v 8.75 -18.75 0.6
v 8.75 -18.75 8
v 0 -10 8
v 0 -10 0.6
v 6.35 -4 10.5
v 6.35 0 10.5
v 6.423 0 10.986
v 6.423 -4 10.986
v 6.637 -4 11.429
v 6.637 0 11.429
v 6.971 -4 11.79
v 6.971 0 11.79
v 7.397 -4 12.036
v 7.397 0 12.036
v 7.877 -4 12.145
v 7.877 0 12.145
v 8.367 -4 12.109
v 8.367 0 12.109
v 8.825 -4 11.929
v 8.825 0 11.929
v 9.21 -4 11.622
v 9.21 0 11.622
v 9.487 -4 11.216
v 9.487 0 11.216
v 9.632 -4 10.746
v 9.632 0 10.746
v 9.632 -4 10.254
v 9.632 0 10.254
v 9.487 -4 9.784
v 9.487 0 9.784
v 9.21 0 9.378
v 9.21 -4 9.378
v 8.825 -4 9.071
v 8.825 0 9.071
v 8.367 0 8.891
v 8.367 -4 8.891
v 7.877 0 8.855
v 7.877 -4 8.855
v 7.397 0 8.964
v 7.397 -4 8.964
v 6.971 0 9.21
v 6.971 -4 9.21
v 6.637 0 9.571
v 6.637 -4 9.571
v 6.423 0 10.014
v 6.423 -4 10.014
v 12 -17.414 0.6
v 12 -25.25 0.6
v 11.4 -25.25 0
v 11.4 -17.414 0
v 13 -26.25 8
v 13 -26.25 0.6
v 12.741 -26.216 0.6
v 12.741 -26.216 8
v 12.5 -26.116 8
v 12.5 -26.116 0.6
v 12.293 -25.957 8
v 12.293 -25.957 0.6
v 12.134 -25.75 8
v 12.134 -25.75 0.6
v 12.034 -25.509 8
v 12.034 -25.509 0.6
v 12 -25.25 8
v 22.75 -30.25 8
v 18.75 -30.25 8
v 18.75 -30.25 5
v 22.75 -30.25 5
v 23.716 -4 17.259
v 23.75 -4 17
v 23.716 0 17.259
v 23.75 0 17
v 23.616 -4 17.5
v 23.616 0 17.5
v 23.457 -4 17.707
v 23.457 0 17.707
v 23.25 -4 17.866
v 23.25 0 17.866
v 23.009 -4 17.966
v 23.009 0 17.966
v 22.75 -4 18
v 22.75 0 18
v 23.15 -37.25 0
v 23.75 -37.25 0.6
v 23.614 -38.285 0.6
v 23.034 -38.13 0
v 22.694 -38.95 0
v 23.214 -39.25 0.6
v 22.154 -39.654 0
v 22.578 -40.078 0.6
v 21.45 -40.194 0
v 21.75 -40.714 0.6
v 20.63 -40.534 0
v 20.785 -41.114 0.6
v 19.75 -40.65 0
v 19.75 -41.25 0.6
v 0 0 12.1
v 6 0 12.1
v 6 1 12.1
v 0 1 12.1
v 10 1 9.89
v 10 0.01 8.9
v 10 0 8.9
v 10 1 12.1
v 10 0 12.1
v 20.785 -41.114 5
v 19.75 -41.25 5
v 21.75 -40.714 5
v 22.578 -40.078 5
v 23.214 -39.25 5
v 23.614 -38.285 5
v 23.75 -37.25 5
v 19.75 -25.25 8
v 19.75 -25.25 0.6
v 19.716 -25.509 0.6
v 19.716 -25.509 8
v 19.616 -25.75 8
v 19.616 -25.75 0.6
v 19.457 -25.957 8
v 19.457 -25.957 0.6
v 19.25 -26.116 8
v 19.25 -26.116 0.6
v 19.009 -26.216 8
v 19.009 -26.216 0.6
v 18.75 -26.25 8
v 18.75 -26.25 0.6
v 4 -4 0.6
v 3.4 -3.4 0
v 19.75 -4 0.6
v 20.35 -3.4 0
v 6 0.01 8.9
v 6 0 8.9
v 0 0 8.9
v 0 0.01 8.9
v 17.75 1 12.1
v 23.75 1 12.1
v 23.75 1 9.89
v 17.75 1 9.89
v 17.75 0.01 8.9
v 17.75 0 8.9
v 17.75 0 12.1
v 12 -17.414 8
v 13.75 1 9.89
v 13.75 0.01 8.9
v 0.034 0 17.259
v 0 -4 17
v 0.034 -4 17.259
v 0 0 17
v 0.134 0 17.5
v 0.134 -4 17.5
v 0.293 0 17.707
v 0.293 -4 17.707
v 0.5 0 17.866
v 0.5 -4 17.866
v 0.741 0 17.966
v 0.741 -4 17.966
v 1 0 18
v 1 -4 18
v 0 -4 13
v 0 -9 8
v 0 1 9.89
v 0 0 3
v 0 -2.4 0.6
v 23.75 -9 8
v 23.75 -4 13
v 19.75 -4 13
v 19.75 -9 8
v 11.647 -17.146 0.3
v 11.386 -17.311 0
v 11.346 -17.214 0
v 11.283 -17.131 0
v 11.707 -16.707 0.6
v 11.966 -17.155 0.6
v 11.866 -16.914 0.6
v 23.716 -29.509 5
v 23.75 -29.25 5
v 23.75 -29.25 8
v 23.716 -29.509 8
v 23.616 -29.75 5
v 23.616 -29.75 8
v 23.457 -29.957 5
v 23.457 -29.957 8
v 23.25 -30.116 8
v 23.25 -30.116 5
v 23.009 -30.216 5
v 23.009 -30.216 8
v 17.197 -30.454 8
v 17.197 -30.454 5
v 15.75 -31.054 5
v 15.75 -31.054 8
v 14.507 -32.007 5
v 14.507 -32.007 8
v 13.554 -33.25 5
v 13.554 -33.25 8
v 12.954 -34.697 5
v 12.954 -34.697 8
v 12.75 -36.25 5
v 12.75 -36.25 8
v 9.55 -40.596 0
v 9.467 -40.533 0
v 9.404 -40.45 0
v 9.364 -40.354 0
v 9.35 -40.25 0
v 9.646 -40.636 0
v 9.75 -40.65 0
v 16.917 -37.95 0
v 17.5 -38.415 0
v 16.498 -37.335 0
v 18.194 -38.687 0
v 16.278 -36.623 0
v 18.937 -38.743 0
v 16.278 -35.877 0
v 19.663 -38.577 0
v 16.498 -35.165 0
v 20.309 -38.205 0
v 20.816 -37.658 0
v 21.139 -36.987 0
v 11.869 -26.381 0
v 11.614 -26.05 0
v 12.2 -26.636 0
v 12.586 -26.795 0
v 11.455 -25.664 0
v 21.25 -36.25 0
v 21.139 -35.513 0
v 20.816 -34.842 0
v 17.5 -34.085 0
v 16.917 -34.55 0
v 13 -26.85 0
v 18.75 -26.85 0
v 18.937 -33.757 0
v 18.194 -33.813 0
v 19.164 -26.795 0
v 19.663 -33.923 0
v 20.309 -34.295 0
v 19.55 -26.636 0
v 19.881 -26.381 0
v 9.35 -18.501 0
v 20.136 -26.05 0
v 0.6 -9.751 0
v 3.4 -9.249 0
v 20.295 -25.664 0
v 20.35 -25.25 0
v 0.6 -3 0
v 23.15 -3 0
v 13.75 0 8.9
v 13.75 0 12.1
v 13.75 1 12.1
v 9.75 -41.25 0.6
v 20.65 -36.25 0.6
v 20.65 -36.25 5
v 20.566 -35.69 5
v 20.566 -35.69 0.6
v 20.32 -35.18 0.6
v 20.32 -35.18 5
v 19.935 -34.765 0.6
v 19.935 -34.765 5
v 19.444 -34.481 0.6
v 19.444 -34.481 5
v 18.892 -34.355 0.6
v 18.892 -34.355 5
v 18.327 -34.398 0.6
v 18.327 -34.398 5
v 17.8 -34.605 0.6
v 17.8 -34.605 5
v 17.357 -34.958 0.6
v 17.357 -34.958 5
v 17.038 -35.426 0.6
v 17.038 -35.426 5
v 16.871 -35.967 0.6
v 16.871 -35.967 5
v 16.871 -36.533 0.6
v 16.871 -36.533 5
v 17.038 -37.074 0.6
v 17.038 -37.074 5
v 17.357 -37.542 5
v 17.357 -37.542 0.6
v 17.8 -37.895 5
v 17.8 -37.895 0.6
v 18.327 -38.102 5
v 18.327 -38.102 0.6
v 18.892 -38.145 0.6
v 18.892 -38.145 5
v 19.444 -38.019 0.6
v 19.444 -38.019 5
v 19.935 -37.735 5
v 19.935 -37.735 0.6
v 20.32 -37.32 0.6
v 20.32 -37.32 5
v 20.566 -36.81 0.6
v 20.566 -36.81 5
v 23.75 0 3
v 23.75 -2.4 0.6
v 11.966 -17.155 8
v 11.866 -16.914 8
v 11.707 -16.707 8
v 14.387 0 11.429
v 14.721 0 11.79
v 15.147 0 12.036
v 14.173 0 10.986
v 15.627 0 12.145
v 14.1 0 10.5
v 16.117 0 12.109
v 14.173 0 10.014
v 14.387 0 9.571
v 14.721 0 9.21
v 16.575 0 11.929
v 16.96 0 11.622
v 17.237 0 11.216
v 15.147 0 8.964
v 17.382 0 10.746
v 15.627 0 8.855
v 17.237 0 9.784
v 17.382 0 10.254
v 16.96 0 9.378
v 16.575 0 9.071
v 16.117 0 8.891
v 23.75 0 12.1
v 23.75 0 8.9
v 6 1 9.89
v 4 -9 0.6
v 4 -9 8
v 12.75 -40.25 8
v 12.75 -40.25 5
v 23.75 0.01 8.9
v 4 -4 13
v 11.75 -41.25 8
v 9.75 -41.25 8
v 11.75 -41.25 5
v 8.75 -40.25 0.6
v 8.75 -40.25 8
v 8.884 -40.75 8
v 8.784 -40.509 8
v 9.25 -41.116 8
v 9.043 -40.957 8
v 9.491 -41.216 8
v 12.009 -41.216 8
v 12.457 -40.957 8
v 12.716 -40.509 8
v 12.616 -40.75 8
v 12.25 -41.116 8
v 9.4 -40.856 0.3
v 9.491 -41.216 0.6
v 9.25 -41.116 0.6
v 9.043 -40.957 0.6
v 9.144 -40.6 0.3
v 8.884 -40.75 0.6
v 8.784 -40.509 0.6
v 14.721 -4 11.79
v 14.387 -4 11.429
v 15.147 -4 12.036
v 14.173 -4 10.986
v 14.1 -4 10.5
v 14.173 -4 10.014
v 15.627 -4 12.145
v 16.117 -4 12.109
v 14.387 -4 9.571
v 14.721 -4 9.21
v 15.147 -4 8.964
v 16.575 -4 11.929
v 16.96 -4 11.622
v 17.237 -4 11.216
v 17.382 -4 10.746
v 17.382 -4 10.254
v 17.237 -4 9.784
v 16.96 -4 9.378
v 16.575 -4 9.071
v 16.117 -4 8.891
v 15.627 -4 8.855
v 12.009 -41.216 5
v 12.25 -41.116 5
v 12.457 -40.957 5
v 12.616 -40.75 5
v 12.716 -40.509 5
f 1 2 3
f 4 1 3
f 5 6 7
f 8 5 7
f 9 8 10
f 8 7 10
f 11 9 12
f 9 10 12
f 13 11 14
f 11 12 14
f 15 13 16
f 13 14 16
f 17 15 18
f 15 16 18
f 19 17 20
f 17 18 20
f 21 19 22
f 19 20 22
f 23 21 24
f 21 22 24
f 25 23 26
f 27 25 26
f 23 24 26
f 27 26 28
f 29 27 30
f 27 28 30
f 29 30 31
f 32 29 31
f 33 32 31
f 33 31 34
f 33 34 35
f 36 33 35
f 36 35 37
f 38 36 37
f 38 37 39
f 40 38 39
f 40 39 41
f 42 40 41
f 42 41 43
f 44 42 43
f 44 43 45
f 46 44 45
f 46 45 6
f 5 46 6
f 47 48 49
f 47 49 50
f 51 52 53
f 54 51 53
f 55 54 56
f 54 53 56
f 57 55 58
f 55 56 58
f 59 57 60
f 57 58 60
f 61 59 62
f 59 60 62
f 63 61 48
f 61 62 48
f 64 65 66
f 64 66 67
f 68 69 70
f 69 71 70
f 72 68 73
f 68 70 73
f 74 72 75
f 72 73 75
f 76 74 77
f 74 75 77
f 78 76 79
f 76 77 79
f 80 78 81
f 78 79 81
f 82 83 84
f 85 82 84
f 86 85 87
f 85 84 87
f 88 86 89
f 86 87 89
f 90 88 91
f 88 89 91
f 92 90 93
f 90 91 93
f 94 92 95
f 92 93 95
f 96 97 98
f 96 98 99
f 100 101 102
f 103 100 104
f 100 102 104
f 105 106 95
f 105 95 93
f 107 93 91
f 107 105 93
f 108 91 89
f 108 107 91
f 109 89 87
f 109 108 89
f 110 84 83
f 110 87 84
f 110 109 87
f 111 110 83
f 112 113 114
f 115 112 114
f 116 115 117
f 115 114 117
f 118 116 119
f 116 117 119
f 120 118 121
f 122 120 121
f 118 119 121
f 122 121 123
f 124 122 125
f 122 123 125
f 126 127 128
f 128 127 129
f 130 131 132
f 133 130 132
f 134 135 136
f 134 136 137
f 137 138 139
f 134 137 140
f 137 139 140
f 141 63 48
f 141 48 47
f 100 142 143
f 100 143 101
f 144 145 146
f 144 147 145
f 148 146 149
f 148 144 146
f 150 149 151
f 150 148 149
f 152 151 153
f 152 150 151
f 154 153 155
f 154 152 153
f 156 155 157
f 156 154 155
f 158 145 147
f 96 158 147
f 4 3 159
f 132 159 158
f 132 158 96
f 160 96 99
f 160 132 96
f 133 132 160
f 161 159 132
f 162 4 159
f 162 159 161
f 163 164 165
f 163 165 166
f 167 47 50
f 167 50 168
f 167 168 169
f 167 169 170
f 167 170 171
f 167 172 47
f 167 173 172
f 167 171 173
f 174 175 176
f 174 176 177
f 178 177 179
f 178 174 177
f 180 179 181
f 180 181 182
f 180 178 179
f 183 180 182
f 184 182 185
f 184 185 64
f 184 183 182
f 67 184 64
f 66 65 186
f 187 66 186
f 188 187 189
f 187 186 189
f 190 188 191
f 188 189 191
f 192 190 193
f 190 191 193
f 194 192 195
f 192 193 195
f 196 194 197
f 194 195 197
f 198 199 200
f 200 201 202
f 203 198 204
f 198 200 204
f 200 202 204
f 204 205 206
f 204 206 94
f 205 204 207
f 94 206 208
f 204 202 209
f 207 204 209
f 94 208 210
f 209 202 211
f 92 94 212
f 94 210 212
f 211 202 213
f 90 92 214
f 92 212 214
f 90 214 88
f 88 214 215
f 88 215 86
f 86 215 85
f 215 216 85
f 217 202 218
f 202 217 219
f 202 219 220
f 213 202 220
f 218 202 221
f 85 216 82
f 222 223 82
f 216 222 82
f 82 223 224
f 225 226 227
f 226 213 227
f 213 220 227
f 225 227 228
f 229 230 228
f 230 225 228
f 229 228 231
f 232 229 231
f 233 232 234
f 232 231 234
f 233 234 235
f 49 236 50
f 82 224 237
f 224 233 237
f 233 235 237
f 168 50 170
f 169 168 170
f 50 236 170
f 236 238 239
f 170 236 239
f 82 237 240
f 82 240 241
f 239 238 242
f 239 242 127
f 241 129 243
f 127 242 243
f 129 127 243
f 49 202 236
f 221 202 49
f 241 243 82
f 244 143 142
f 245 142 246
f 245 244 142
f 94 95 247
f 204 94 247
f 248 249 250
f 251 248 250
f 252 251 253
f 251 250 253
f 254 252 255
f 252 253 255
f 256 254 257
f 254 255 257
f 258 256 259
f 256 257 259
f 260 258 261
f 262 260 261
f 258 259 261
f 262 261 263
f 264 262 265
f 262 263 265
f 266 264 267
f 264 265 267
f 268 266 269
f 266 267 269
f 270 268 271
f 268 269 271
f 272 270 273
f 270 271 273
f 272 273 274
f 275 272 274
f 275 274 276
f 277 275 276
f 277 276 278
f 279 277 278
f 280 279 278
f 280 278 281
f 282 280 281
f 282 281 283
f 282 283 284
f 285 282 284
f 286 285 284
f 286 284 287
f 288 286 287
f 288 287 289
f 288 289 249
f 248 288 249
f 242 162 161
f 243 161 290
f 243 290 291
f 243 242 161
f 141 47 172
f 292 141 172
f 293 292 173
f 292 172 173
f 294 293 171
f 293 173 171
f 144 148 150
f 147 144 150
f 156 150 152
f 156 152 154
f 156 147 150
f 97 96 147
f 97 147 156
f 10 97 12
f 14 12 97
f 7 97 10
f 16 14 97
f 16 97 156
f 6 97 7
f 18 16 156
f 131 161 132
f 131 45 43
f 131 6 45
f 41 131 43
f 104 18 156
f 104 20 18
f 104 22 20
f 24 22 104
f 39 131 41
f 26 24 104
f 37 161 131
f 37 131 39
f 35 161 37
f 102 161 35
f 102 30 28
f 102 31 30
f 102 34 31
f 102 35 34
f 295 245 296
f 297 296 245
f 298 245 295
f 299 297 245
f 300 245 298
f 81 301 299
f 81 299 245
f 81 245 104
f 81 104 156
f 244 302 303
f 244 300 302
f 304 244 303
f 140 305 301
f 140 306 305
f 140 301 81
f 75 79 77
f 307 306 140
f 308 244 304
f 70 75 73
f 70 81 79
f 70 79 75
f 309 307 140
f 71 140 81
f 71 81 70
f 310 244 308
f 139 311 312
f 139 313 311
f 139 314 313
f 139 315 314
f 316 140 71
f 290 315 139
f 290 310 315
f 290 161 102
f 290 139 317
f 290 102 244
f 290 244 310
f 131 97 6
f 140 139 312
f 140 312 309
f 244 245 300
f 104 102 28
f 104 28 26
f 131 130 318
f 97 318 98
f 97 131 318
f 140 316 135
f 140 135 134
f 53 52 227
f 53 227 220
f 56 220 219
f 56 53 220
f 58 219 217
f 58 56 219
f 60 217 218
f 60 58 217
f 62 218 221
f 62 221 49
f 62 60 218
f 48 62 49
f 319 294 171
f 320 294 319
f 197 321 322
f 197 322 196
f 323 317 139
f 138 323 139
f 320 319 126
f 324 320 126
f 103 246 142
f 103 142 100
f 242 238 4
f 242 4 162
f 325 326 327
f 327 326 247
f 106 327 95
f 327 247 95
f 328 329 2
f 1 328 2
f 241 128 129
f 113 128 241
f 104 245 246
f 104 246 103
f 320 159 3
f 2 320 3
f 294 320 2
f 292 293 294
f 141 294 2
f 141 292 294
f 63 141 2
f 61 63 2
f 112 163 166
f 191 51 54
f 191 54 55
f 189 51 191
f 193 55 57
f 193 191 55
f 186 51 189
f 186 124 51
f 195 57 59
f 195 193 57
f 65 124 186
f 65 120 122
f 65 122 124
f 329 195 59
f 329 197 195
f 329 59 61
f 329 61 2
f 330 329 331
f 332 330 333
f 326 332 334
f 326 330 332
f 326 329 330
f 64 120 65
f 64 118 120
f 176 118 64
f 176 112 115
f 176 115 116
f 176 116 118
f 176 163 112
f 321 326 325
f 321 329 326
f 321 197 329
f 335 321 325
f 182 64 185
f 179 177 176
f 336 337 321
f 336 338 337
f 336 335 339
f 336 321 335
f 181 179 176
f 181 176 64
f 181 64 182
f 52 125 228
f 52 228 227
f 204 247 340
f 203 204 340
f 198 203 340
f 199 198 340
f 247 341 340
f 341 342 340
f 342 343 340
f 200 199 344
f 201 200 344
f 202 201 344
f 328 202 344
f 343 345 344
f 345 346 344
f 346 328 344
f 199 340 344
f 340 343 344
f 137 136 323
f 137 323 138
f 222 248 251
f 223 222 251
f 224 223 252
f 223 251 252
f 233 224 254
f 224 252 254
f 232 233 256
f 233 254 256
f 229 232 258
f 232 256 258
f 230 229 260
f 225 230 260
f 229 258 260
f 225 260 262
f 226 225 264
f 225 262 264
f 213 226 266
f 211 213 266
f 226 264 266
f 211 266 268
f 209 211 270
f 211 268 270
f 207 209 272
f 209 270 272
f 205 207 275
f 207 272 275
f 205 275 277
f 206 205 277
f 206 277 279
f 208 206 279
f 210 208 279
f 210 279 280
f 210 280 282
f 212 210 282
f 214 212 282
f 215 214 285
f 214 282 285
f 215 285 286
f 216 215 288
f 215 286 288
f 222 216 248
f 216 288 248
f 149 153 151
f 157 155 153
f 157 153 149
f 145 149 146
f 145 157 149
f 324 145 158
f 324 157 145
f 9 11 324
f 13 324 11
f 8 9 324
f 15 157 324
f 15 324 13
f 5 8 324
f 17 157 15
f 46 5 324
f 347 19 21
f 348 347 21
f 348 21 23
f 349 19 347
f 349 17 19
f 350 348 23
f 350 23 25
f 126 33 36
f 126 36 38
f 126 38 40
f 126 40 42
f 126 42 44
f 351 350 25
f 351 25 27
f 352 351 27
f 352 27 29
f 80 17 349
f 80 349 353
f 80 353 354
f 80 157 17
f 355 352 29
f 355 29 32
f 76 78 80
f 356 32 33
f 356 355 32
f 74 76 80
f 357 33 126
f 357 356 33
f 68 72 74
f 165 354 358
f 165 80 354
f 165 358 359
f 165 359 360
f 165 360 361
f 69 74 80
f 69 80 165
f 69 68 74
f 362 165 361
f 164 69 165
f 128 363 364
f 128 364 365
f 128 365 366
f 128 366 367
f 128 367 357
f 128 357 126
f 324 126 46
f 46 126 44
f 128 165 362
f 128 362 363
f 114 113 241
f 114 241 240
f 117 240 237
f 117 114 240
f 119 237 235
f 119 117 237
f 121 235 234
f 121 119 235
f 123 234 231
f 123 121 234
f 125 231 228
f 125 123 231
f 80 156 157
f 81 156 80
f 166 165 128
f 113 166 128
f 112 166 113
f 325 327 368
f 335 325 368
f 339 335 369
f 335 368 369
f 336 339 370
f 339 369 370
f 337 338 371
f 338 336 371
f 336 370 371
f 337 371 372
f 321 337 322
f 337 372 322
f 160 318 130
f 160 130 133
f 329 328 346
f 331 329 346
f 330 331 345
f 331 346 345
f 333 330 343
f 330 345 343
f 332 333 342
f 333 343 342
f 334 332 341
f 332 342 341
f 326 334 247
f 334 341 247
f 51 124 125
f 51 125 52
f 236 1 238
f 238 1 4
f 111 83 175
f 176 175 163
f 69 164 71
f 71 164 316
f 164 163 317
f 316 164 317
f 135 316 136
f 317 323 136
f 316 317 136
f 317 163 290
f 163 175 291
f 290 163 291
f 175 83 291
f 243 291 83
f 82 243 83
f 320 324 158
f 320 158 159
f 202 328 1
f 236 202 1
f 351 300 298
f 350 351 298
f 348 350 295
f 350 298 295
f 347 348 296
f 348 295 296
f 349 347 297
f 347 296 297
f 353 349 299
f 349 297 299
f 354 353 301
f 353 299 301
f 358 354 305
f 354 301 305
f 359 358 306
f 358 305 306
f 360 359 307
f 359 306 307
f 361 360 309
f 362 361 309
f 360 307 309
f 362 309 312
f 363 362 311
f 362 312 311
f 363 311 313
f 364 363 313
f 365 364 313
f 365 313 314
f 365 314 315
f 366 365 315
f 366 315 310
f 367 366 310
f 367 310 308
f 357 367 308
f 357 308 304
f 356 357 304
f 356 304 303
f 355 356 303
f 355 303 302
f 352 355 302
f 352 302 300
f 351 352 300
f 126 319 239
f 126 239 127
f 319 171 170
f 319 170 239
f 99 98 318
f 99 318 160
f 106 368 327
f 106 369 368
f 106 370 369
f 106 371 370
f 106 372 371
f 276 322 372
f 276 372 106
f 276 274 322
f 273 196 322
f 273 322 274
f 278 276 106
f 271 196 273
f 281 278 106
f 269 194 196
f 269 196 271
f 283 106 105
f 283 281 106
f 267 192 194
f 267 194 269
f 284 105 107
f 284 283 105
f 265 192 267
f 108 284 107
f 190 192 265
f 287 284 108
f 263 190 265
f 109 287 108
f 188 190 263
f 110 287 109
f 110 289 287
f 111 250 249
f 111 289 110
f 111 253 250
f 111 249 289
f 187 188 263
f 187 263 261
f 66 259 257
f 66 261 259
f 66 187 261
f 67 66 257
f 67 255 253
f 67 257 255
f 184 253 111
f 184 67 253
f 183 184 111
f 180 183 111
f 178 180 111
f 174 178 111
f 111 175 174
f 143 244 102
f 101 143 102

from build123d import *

# Parameters (mm, degrees)
SKETCH010_W                                = 23.75
SKETCH010_H                                = 41.25
PAD003_DEPTH                               = 18
CHAMFER004013007011015006009007001028_SIZE = 3
SKETCH011_R                                = 1.9
POCKET007_DEPTH                            = 18.001
POCKET008_DEPTH                            = 13
FILLET_R                                   = 4
POCKET009_DEPTH                            = 18.001
FILLET001_R                                = 1
POCKET010_DEPTH                            = 23.751
FILLET002_R                                = 1
POCKET011_DEPTH                            = 18.001
FILLET003_R                                = 1
SKETCH016_R                                = 1.65
POCKET012_DEPTH                            = 41.251
SKETCH017_W                                = 6
SKETCH017_H                                = 3.2
SKETCH017_W_2                              = 3.75
PAD004_DEPTH                               = 1
CHAMFER004013007011015006009007001029_SIZE = 0.99
CHAMFER004013007011015006009007001030_SIZE = 0.6
CHAMFER004013007011015006009007001031_SIZE = 0.6


with BuildPart() as part:
    # Sketch010 → Pad003 (new body)
    with BuildSketch(Plane.XY):
        with Locations((11.875, -20.625)):
            Rectangle(SKETCH010_W, SKETCH010_H)
    extrude(amount=PAD003_DEPTH)

    # Chamfer004013007011015006009007001028
    chamfer004013007011015006009007001028_edges = [part.edges().sort_by_distance(p)[0] for p in [
        (11.875, 0, 0),
    ]]
    chamfer(chamfer004013007011015006009007001028_edges, length=CHAMFER004013007011015006009007001028_SIZE)

    # Sketch011 (on Face4 of Chamfer004013007011015006009007001028) → Pocket007 (cut, through all)
    with BuildSketch(Plane.XY.offset(18)):
        with Locations((18.75, -36.25)):
            Circle(SKETCH011_R)
    extrude(amount=-POCKET007_DEPTH, mode=Mode.SUBTRACT)

    # Sketch012 (on Face4 of Pocket007) → Pocket008 (cut)
    with BuildSketch(Plane.XY.offset(18)):
        with BuildLine():
            ThreePointArc((18.75, -30.25), (14.507359, -32.007359), (12.75, -36.25))
            Line((12.75, -41.25), (12.75, -36.25))
            Line((23.75, -41.25), (12.75, -41.25))
            Line((23.75, -30.25), (23.75, -41.25))
            Line((18.75, -30.25), (23.75, -30.25))
        make_face()
    extrude(amount=-POCKET008_DEPTH, mode=Mode.SUBTRACT)

    # Fillet
    fillet_edges = [part.edges().sort_by_distance(p)[0] for p in [
        (23.75, -41.25, 2.5),
    ]]
    fillet(fillet_edges, radius=FILLET_R)

    # Sketch013 (on Face8 of Fillet) → Pocket009 (cut, through all)
    with BuildSketch(Plane.XY.offset(18)):
        Polygon((0, -10), (0, -41.25), (8.75, -41.25), (8.75, -18.75), align=None)
    extrude(amount=-POCKET009_DEPTH, mode=Mode.SUBTRACT)

    # Fillet001
    fillet001_edges = [part.edges().sort_by_distance(p)[0] for p in [
        (8.75, -41.25, 9),
        (12.75, -41.25, 11.5),
        (23.75, -30.25, 11.5),
    ]]
    fillet(fillet001_edges, radius=FILLET001_R)

    # Sketch014 (on Face1 of Fillet001) → Pocket010 (cut, through all)
    with BuildSketch(Plane.YZ.offset(23.75)):
        Polygon((-42, 8), (-42, 19), (-4, 19), (-4, 13), (-9, 8), align=None)
    extrude(amount=-POCKET010_DEPTH, mode=Mode.SUBTRACT)

    # Fillet002
    fillet002_edges = [part.edges().sort_by_distance(p)[0] for p in [
        (0, -2, 18),
        (23.75, -2, 18),
    ]]
    fillet(fillet002_edges, radius=FILLET002_R)

    # Sketch015 (on Face14 of Fillet002) → Pocket011 (cut, through all)
    with BuildSketch(Plane.XY.offset(18)):
        Polygon((4, -4), (19.75, -4), (19.75, -26.25), (12, -26.25), (12, -17), (4, -9), align=None)
    extrude(amount=-POCKET011_DEPTH, mode=Mode.SUBTRACT)

    # Fillet003
    fillet003_edges = [part.edges().sort_by_distance(p)[0] for p in [
        (12, -26.25, 4),
        (19.75, -26.25, 4),
        (12, -17, 4),
    ]]
    fillet(fillet003_edges, radius=FILLET003_R)

    # Sketch016 (on Face26 of Fillet003) → Pocket012 (cut, through all)
    with BuildSketch(Plane(origin=(0, 0, 0), x_dir=(-1, 0, 0), z_dir=(0, 1, 0))):
        with Locations((-15.75, 10.5)):
            Circle(SKETCH016_R)
        with Locations((-8, 10.5)):
            Circle(SKETCH016_R)
    extrude(amount=-POCKET012_DEPTH, mode=Mode.SUBTRACT)

    # Sketch017 (on Face28 of Pocket012) → Pad004 (join)
    with BuildSketch(Plane(origin=(0, 0, 0), x_dir=(-1, 0, 0), z_dir=(0, 1, 0))):
        with Locations((-20.75, 10.5)):
            Rectangle(SKETCH017_W, SKETCH017_H)
        with Locations((-11.875, 10.5)):
            Rectangle(SKETCH017_W_2, SKETCH017_H)
        with Locations((-3, 10.5)):
            Rectangle(SKETCH017_W, SKETCH017_H)
    extrude(amount=PAD004_DEPTH)

    # Chamfer004013007011015006009007001029
    chamfer004013007011015006009007001029_edges = [part.edges().sort_by_distance(p)[0] for p in [
        (20.75, 1, 8.9),
        (11.875, 1, 8.9),
        (3, 1, 8.9),
    ]]
    chamfer(chamfer004013007011015006009007001029_edges, length=CHAMFER004013007011015006009007001029_SIZE)

    # Chamfer004013007011015006009007001030
    chamfer004013007011015006009007001030_edges = [part.edges().sort_by_distance(p)[0] for p in [
        (0, -6.5, 0),
        (4.375, -14.375, 0),
        (8.75, -29.5, 0),
        (9.042893, -40.957107, 0),
        (14.75, -41.25, 0),
        (22.578427, -40.078427, 0),
        (16.85, -36.25, 0),
        (23.75, -20.125, 0),
    ]]
    chamfer(chamfer004013007011015006009007001030_edges, length=CHAMFER004013007011015006009007001030_SIZE)

    # Chamfer004013007011015006009007001031
    chamfer004013007011015006009007001031_edges = [part.edges().sort_by_distance(p)[0] for p in [
        (11.875, -4, 0),
        (4, -6.5, 0),
        (7.853553, -12.853553, 0),
        (11.92388, -17.03153, 0),
        (12, -21.332107, 0),
        (12.292893, -25.957107, 0),
        (15.875, -26.25, 0),
        (19.457107, -25.957107, 0),
        (19.75, -14.625, 0),
    ]]
    chamfer(chamfer004013007011015006009007001031_edges, length=CHAMFER004013007011015006009007001031_SIZE)


solid = part.part
